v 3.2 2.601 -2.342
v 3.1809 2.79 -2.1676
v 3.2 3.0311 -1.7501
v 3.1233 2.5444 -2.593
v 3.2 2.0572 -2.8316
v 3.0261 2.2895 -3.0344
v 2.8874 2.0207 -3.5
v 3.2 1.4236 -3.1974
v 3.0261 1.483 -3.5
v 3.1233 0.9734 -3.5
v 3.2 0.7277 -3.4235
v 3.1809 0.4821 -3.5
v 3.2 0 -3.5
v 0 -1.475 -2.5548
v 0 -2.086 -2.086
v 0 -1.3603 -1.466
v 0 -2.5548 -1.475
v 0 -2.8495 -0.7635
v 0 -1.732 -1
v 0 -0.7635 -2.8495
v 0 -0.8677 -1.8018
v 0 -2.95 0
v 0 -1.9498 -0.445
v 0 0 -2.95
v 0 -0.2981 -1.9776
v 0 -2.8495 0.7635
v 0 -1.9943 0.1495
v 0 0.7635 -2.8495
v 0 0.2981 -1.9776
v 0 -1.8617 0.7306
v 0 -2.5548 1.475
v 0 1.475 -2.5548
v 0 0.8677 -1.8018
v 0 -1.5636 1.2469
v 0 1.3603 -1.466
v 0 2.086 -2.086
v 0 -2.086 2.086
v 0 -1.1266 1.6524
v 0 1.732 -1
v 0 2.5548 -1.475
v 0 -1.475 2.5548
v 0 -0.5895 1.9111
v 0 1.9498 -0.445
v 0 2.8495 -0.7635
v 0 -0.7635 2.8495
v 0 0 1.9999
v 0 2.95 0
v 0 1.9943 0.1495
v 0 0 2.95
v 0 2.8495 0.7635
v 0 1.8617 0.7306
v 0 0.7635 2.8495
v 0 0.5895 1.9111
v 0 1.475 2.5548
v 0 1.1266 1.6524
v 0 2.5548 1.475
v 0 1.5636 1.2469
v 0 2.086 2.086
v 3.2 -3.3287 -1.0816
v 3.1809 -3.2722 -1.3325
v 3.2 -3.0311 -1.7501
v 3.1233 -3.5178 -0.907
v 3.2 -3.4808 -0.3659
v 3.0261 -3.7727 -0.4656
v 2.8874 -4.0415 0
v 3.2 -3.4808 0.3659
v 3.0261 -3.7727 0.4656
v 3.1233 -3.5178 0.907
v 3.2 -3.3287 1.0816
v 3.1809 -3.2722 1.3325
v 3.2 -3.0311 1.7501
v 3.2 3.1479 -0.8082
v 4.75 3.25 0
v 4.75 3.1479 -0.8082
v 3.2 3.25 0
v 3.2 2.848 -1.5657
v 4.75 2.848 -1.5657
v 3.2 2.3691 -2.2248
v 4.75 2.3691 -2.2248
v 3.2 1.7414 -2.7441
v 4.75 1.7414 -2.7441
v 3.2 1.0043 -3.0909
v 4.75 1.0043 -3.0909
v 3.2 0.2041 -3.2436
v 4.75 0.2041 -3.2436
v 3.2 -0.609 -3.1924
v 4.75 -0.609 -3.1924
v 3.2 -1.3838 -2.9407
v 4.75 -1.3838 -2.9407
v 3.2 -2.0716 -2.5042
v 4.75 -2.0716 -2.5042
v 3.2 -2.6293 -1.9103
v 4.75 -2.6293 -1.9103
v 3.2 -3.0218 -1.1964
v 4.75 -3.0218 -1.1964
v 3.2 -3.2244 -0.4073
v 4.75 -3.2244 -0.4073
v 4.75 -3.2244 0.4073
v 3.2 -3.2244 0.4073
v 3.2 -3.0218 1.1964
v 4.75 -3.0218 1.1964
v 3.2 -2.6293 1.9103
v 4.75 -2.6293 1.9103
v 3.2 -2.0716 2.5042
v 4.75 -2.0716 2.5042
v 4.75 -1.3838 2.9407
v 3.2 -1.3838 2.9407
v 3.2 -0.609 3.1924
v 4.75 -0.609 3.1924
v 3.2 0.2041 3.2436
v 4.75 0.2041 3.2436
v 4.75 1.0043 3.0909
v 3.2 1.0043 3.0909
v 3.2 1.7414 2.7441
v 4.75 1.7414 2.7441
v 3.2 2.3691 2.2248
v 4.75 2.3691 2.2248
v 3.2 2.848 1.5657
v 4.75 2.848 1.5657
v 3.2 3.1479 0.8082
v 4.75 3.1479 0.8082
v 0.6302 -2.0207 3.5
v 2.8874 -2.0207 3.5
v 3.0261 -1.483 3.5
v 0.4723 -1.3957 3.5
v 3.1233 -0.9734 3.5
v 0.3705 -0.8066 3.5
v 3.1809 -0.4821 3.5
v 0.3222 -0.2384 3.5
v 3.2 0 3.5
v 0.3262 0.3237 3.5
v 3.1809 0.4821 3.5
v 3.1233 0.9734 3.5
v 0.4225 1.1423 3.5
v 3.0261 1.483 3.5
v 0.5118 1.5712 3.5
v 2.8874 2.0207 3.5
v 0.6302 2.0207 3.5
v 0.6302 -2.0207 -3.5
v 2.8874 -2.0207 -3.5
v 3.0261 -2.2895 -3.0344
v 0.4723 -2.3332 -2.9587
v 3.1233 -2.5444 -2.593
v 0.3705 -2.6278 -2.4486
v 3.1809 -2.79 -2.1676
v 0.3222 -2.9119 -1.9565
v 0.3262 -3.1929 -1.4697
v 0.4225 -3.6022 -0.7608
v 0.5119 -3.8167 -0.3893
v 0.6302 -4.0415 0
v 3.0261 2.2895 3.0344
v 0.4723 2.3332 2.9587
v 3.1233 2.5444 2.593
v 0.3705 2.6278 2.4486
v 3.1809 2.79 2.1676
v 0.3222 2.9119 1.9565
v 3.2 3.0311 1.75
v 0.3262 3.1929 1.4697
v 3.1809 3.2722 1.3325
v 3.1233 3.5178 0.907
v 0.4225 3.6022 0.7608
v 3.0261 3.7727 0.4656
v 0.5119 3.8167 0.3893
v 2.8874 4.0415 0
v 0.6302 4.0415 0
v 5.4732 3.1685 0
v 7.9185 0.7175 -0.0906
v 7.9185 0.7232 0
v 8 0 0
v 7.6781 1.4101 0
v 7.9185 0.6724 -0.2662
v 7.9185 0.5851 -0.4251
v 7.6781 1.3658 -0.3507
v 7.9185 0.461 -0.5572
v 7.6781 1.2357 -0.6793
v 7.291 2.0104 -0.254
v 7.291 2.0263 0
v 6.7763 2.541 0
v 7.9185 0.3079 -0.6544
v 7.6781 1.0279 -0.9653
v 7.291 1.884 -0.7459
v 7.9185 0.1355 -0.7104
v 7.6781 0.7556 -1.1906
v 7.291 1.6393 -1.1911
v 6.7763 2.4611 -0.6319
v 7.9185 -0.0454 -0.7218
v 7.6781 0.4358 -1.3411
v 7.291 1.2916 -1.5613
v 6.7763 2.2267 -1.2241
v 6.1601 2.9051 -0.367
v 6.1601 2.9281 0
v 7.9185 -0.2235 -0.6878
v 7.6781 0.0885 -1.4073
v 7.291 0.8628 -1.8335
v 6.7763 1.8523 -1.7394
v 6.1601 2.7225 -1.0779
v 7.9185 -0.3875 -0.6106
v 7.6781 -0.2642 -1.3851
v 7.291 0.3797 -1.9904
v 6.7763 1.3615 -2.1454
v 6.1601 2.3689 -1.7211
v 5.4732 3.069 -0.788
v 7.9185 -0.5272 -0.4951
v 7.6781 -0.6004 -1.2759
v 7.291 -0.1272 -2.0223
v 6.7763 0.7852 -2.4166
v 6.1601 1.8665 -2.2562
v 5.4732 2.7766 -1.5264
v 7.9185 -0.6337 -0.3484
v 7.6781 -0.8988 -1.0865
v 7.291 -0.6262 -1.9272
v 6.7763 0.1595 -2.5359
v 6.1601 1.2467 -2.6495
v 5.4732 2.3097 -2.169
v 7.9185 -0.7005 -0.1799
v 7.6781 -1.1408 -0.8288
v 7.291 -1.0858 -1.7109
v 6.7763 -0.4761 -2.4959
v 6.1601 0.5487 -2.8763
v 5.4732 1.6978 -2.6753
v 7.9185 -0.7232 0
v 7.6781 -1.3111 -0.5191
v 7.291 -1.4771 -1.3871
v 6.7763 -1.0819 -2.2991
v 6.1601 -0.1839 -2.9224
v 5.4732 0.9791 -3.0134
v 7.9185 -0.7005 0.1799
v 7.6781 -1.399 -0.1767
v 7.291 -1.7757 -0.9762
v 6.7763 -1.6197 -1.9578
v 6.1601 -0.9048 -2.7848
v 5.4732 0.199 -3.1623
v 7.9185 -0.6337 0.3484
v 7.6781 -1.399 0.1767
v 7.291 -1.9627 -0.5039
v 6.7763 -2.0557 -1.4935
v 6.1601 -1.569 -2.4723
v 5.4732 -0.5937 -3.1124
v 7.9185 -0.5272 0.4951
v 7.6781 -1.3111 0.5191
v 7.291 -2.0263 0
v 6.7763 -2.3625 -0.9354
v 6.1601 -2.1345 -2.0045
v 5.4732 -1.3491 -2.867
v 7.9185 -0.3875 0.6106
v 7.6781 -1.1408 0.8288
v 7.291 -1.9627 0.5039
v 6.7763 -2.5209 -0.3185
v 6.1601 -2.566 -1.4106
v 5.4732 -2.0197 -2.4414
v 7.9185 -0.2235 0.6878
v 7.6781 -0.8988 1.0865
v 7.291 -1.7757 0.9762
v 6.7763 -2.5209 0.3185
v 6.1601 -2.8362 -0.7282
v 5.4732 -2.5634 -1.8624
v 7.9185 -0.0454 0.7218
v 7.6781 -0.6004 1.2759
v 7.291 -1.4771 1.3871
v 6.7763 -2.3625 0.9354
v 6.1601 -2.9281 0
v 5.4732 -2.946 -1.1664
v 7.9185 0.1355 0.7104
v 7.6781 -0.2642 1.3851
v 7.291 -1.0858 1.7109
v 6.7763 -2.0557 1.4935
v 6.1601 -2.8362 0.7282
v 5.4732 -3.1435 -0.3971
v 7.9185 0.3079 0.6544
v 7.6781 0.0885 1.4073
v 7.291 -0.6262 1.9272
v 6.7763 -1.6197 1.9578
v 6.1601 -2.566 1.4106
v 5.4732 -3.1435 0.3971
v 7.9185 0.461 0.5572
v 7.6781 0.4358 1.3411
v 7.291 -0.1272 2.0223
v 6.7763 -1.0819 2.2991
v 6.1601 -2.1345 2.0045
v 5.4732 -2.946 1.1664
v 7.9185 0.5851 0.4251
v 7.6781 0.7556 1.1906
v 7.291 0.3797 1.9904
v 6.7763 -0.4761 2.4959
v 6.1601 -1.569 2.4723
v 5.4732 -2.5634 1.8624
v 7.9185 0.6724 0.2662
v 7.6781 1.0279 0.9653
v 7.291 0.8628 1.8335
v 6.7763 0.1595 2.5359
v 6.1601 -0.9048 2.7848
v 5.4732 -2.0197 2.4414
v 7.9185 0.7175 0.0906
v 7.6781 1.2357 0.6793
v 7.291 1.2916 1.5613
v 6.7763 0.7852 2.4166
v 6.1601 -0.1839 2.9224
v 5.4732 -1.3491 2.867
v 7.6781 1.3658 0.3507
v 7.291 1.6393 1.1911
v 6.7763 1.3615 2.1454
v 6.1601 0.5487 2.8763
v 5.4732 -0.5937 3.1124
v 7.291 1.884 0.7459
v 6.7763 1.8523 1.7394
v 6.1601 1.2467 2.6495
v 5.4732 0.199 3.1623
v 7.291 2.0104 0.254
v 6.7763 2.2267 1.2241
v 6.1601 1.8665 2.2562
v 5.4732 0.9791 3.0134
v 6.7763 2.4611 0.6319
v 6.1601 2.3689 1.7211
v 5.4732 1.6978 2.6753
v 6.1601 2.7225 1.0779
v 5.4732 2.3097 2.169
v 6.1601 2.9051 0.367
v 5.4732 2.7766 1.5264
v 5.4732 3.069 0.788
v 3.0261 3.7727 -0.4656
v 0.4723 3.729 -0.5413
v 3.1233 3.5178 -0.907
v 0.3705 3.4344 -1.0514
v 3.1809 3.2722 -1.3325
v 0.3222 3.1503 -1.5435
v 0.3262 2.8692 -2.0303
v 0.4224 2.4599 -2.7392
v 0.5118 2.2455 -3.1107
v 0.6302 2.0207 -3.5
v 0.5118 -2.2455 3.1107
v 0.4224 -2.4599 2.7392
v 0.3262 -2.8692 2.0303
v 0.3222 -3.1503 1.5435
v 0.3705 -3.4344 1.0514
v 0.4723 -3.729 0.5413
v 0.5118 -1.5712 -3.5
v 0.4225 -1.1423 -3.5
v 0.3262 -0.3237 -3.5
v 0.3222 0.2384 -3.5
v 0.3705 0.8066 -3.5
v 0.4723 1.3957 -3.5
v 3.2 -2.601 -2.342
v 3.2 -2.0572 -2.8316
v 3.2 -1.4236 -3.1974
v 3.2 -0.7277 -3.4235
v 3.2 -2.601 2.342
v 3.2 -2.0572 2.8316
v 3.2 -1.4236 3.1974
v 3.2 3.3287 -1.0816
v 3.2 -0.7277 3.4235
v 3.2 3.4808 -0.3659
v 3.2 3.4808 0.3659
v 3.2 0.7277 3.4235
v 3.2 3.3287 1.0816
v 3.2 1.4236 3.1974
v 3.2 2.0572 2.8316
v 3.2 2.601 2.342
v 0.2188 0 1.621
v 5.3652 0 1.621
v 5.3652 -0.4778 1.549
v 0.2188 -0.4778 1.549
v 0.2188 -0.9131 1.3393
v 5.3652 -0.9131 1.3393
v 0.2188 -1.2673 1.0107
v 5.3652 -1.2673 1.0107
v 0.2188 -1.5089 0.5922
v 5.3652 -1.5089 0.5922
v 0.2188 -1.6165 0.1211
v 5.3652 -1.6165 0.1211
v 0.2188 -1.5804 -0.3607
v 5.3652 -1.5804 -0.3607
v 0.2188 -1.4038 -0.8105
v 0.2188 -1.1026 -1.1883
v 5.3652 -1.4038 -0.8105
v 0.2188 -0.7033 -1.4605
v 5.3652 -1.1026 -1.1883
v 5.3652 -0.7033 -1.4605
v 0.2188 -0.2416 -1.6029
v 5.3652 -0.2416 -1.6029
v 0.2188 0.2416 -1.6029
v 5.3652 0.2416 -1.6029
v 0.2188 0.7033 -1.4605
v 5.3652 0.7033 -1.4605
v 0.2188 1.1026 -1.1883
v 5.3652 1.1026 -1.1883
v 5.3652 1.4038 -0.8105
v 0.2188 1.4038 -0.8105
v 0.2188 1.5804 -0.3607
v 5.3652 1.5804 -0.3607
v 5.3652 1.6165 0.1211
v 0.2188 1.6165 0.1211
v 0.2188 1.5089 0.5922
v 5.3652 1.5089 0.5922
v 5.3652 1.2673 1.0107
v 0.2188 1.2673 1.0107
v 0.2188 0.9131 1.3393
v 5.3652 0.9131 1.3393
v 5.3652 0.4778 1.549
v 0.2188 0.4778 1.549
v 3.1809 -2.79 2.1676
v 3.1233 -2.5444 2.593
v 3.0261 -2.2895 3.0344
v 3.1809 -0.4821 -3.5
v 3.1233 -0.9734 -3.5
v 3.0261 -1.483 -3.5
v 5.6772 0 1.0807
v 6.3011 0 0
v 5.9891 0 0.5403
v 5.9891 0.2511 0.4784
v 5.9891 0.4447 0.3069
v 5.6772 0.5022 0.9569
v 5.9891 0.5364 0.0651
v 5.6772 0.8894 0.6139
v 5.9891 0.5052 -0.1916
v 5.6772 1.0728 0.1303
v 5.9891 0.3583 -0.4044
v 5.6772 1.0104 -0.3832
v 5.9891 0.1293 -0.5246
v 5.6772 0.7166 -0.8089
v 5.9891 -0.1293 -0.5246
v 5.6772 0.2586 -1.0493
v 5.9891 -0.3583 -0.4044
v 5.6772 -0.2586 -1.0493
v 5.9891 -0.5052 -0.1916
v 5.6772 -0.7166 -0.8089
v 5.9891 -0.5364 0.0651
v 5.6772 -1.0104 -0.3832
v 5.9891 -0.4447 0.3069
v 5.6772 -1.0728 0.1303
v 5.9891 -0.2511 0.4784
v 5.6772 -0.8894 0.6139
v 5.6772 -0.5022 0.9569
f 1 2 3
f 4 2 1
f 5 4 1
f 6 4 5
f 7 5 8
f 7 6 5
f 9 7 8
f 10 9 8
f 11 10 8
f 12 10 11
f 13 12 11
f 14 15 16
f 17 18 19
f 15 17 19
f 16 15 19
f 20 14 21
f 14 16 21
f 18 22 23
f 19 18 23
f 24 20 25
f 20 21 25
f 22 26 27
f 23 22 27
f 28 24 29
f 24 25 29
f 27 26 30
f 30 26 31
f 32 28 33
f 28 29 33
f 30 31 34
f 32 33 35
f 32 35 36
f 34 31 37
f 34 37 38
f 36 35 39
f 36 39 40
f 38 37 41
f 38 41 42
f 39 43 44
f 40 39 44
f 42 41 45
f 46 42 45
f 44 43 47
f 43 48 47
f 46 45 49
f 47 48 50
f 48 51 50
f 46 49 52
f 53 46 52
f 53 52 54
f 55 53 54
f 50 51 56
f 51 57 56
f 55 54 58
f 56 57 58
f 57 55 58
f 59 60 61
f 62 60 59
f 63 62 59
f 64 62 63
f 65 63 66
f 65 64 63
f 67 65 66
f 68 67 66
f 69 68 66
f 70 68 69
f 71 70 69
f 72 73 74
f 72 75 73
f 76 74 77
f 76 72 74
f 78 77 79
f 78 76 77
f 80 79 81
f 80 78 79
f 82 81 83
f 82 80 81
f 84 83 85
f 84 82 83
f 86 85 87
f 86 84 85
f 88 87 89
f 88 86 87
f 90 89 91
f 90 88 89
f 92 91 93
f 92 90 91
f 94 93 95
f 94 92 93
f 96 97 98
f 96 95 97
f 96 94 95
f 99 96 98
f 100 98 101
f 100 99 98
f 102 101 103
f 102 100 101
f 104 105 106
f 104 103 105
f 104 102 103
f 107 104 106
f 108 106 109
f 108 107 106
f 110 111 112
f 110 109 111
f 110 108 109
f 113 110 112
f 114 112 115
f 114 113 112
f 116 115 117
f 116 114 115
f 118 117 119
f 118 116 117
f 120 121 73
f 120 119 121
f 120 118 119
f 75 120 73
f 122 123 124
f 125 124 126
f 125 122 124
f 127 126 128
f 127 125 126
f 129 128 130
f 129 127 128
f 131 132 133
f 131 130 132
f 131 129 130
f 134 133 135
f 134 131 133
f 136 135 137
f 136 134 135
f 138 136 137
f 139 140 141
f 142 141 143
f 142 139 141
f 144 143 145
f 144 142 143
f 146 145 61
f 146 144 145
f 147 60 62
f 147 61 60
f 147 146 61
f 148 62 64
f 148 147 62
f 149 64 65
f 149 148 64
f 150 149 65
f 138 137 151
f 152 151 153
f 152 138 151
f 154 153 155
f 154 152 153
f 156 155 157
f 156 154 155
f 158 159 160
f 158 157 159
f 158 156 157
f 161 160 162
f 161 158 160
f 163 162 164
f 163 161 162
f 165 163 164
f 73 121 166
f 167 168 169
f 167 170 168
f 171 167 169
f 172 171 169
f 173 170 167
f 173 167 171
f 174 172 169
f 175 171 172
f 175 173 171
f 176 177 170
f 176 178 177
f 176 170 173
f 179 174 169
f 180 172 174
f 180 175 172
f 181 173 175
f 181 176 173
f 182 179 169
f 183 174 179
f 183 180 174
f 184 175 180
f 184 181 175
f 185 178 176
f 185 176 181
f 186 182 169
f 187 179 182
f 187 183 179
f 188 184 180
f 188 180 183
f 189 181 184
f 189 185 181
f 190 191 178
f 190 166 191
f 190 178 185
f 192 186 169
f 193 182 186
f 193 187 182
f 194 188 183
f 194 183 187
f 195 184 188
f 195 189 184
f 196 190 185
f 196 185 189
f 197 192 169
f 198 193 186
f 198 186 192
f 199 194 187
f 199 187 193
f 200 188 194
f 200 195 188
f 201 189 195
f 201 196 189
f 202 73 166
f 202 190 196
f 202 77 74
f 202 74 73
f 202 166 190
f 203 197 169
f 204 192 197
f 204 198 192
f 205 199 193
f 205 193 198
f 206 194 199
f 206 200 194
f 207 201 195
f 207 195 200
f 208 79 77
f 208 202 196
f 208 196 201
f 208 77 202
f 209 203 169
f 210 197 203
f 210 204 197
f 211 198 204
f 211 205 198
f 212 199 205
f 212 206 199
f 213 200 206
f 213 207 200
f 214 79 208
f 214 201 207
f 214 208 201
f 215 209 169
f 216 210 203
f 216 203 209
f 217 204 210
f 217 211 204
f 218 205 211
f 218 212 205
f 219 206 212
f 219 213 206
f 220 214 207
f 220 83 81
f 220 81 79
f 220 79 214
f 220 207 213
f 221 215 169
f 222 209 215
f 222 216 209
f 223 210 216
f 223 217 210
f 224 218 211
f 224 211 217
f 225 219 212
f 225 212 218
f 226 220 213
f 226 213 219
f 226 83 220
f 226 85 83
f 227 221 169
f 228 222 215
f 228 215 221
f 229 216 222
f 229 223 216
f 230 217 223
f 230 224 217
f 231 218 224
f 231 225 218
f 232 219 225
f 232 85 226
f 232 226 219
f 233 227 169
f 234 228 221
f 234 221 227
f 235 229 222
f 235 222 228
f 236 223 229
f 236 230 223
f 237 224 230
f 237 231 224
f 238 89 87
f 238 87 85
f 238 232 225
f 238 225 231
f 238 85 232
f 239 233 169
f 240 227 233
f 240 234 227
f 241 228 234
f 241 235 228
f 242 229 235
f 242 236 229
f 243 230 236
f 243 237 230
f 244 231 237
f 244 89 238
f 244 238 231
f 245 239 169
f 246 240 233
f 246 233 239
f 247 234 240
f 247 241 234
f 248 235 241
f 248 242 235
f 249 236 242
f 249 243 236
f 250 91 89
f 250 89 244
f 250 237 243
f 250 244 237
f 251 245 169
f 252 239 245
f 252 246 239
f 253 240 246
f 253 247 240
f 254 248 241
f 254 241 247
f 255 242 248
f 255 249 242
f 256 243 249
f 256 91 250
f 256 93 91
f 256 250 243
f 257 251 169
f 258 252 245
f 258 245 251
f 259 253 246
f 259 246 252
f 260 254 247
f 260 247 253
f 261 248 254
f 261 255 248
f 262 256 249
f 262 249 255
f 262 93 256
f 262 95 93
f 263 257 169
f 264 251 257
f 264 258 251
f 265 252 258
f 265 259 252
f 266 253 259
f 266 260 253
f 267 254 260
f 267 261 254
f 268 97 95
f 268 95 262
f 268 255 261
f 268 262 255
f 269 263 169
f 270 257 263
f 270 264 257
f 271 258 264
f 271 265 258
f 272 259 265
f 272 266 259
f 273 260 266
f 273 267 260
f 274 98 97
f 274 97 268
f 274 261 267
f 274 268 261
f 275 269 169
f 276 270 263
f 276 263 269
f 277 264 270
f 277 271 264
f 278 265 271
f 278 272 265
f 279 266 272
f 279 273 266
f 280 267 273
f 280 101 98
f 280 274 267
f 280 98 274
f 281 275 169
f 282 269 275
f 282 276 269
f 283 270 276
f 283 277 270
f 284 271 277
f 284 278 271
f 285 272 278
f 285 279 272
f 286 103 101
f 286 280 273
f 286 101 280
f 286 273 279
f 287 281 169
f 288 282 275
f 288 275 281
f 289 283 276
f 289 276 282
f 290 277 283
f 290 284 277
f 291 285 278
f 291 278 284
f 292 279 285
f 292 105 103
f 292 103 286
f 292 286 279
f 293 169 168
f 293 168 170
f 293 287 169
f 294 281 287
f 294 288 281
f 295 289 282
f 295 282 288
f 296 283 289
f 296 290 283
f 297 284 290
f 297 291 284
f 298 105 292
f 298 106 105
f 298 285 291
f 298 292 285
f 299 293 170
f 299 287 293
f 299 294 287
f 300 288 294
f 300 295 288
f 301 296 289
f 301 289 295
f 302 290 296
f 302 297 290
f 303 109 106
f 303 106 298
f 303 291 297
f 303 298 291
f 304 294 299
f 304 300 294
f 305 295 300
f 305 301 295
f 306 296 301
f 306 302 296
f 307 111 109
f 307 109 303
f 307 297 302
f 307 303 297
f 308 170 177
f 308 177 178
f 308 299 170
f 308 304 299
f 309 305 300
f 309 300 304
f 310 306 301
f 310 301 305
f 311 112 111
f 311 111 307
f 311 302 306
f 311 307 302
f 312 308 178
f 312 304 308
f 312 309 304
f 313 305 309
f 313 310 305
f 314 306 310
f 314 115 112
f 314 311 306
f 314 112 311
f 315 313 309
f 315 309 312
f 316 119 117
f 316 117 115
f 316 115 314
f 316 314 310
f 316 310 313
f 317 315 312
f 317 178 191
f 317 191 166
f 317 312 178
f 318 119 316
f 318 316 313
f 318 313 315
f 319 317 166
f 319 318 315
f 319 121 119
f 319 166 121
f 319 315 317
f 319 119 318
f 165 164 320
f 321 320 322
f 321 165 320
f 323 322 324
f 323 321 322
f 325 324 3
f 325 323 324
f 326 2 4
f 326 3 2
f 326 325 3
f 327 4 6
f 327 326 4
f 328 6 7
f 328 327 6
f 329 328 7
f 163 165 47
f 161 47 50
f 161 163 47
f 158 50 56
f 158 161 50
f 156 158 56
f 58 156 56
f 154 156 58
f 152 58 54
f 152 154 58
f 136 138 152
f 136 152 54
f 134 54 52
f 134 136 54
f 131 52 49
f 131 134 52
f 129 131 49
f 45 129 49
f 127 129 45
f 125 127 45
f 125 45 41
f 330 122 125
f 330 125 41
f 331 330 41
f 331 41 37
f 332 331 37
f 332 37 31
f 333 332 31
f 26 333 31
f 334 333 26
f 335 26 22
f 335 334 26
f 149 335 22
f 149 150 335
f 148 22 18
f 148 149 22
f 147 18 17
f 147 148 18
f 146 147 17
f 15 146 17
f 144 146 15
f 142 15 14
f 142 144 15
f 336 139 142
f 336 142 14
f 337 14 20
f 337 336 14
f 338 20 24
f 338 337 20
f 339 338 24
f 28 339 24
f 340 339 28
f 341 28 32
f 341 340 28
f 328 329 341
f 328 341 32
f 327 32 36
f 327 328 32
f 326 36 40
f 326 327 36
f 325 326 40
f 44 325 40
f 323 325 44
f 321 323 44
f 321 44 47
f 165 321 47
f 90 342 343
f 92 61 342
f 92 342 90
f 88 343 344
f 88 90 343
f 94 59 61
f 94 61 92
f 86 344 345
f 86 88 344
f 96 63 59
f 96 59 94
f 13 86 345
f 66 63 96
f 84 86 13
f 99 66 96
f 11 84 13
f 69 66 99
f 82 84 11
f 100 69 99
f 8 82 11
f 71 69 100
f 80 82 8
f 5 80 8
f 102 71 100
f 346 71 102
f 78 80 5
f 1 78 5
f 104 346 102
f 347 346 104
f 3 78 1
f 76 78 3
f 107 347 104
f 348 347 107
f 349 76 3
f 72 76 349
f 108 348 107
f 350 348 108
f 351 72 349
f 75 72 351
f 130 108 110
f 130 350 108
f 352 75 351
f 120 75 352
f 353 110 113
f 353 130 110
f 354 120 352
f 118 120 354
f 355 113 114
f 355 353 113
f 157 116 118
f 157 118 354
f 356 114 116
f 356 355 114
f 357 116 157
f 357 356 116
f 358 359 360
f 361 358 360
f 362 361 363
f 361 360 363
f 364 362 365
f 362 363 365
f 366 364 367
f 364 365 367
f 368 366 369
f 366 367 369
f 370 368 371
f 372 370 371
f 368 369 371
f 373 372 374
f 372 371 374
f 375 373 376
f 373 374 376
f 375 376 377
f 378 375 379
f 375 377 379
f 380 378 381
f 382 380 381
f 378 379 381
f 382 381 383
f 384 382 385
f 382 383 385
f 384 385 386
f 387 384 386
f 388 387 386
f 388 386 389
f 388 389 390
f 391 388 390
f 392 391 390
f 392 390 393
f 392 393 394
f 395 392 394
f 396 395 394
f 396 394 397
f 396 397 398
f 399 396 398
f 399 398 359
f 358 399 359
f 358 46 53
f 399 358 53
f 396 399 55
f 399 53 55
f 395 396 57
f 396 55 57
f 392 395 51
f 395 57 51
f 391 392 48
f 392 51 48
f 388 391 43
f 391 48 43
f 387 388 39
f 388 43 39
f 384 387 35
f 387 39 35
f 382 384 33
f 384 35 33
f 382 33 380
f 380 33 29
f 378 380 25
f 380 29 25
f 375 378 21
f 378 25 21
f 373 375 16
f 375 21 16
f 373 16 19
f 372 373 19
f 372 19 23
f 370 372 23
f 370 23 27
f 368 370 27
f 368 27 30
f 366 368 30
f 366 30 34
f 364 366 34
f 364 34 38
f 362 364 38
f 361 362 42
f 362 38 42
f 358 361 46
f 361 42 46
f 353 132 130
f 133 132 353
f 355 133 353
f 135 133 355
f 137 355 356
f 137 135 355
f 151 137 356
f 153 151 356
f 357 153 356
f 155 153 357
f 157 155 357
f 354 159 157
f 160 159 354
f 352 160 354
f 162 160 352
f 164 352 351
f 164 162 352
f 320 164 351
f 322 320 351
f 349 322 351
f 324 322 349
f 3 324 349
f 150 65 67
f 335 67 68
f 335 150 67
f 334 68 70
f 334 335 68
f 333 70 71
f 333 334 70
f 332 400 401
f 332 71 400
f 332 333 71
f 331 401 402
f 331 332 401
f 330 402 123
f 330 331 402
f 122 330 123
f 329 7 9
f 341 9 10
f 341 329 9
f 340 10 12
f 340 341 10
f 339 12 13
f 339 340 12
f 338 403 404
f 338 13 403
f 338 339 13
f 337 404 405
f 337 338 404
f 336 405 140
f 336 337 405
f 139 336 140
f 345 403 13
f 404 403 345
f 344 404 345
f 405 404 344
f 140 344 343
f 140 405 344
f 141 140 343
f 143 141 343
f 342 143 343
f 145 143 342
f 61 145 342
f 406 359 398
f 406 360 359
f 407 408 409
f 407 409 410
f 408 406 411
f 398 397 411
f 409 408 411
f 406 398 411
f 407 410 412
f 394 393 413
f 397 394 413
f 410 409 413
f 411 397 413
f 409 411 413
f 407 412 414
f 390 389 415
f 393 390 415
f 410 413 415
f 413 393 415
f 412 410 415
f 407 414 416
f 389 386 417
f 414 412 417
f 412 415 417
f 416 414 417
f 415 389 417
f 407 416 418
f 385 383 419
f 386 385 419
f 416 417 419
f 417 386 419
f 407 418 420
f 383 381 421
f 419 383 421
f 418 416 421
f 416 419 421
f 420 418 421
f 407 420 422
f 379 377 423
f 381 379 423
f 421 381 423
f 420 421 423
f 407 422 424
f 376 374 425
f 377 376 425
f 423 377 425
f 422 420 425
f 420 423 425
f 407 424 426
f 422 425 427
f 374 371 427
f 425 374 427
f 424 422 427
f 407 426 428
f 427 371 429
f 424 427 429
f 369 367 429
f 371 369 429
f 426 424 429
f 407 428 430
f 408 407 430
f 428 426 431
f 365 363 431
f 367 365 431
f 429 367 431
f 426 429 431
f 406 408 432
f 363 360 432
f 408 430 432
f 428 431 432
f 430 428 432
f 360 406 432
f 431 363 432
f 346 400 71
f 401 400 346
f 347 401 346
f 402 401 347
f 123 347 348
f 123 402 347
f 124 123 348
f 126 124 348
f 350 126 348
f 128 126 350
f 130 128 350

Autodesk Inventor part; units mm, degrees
ref_plane "YZ Plane" through (0, 0, 0) normal (1, 0, 0) x (0, 1, 0)
ref_plane "XZ Plane" through (0, 0, 0) normal (0, 1, 0) x (-1, 0, 0)
sketch "Boceto1" plane through (0, 0, 0) normal (1, 0, 0) x (0, 1, 0)
  line L0 (-2.0207, -3.5) -> (-4.0415, 0)
  line L1 (-4.0415, 0) -> (-2.0207, 3.5)
  line L2 (-2.0207, 3.5) -> (2.0207, 3.5)
  line L3 (2.0207, 3.5) -> (4.0415, 0)
  line L4 (4.0415, 0) -> (2.0207, -3.5)
  line L5 (2.0207, -3.5) -> (-2.0207, -3.5)
  point P0 (0, 0)
  point P1 (0, 0)
  dimension "d0" = 8.0829
extrude "Cuerpo" add sketch "Boceto1" along normal blind 3.2
sketch "Boceto2" plane through (0, 0, 0) normal (0, 0, 1) x (1, 0, 0)
  line L0 (3.2, 0) -> (8, 0)
  arc A0 (8, 0) -> (4.75, 3.25) centre (4.75, 0) ccw
  line L1 (4.75, 3.25) -> (3.2, 3.25)
  line L2 (3.2, -2.0207) -> (3.2, 2.0207) projected
  line L3 (3.2, 0) -> (3.2, 3.25)
  line L4 (2.1054, 0) -> (9.7677, 0) projected
  dimension "d8" = 3.25
  dimension "d9" = 4.8
revolve "Remate" add sketch "Boceto2" angle 360 about axis through (3.2, 0, 0) along (1, 0, 0)
sketch "Boceto3" plane through (0, 0, 0) normal (-1, 0, 0) x (0, 0, 1)
  line L0 (0, -5.658) -> (0, 5.658) projected
  line L1 (-4.9, 0) -> (4.9, 0) projected
  point P0 (0, 0)
hole "Rosca" at (0, 0, 0) direction (1, 0, 0) diameter 3.242 depth 5.3652 tip angle 120 thread size "M4x0.7" class "6H" standard "ISO Metric profile"
sketch "Boceto4" plane through (0, 0, 0) normal (0, 0, 1) x (1, 0, 0)
  line L0 (0, 2.0207) -> (0, 4.0415) projected
  line L1 (0, 4.0415) -> (3.2, 4.0415) projected
  line L2 (3.2, 2.0207) -> (3.2, 4.0415) projected
  line L3 (-0.64, 0) -> (3.84, 0) projected
  line L4 (0.6302, 4.0415) -> (0, 2.95)
  line L5 (2.8874, 4.0415) -> (3.2, 3.5)
  dimension "d3" = 5.9
  dimension "d4" = 30
  dimension "d5" = 7
  dimension "d6" = 30
revolve "Chaflán1" cut sketch "Boceto4" angle 360 about axis through (-10, 0, 0) along (1, 0, 0)
chamfer "Chaflán2" distance 0.3789 angle 30 1 edges at (0, 0, -1.621) measured on face at (0, 2.4745, -0.3005)
ref_plane "Work Plane1" through (2.6826, 0, 0) normal (0, 0.866, -0.5) x (-1, 0, 0)
equation "\"d0\" = 1.1547 * SW"
equation "\"d1\" = SIH"
equation "\"d8\" = KR"
equation "\"d9\" = KOH1 - SIH"
equation "\"d11\" = GEL"
equation "\"d12\" = 1.02 * GEL"
equation "\"d3\" = SW0"
equation "\"d4\" = ANG1"
equation "\"d5\" = SW01"
equation "\"d6\" = ANG2"
equation "\"d14\" = -0.5 * GD1 + 0.5 * NND"
equation "\"d36\" = -0.5 * GD1 + 0.5 * NND"
equation "\"ANG1\" = 30deg"
equation "\"ANG2\" = 30deg"
equation "\"NND\" = 4"
equation "\"SIH\" = 3.2"
equation "\"KOH1\" = 8"
equation "\"GEL\" = 5.26"
equation "\"SW\" = 7"
equation "\"KR\" = 3.25"
equation "\"SW0\" = 5.9"
equation "\"SW01\" = SW"
equation "\"GUL\" = 0.541266 * PTC"
equation "\"THREADDIA\" = 4"
equation "\"TOA\" = 30deg"
equation "\"PTC\" = 0.7"
equation "\"E0\" = 1.155 * SW"
equation "\"GAL\" = 0.541266 * PTC"
equation "\"GD1\" = 3.242228"
properties part number "CF-TCA-0003" material "Acero, suave"
